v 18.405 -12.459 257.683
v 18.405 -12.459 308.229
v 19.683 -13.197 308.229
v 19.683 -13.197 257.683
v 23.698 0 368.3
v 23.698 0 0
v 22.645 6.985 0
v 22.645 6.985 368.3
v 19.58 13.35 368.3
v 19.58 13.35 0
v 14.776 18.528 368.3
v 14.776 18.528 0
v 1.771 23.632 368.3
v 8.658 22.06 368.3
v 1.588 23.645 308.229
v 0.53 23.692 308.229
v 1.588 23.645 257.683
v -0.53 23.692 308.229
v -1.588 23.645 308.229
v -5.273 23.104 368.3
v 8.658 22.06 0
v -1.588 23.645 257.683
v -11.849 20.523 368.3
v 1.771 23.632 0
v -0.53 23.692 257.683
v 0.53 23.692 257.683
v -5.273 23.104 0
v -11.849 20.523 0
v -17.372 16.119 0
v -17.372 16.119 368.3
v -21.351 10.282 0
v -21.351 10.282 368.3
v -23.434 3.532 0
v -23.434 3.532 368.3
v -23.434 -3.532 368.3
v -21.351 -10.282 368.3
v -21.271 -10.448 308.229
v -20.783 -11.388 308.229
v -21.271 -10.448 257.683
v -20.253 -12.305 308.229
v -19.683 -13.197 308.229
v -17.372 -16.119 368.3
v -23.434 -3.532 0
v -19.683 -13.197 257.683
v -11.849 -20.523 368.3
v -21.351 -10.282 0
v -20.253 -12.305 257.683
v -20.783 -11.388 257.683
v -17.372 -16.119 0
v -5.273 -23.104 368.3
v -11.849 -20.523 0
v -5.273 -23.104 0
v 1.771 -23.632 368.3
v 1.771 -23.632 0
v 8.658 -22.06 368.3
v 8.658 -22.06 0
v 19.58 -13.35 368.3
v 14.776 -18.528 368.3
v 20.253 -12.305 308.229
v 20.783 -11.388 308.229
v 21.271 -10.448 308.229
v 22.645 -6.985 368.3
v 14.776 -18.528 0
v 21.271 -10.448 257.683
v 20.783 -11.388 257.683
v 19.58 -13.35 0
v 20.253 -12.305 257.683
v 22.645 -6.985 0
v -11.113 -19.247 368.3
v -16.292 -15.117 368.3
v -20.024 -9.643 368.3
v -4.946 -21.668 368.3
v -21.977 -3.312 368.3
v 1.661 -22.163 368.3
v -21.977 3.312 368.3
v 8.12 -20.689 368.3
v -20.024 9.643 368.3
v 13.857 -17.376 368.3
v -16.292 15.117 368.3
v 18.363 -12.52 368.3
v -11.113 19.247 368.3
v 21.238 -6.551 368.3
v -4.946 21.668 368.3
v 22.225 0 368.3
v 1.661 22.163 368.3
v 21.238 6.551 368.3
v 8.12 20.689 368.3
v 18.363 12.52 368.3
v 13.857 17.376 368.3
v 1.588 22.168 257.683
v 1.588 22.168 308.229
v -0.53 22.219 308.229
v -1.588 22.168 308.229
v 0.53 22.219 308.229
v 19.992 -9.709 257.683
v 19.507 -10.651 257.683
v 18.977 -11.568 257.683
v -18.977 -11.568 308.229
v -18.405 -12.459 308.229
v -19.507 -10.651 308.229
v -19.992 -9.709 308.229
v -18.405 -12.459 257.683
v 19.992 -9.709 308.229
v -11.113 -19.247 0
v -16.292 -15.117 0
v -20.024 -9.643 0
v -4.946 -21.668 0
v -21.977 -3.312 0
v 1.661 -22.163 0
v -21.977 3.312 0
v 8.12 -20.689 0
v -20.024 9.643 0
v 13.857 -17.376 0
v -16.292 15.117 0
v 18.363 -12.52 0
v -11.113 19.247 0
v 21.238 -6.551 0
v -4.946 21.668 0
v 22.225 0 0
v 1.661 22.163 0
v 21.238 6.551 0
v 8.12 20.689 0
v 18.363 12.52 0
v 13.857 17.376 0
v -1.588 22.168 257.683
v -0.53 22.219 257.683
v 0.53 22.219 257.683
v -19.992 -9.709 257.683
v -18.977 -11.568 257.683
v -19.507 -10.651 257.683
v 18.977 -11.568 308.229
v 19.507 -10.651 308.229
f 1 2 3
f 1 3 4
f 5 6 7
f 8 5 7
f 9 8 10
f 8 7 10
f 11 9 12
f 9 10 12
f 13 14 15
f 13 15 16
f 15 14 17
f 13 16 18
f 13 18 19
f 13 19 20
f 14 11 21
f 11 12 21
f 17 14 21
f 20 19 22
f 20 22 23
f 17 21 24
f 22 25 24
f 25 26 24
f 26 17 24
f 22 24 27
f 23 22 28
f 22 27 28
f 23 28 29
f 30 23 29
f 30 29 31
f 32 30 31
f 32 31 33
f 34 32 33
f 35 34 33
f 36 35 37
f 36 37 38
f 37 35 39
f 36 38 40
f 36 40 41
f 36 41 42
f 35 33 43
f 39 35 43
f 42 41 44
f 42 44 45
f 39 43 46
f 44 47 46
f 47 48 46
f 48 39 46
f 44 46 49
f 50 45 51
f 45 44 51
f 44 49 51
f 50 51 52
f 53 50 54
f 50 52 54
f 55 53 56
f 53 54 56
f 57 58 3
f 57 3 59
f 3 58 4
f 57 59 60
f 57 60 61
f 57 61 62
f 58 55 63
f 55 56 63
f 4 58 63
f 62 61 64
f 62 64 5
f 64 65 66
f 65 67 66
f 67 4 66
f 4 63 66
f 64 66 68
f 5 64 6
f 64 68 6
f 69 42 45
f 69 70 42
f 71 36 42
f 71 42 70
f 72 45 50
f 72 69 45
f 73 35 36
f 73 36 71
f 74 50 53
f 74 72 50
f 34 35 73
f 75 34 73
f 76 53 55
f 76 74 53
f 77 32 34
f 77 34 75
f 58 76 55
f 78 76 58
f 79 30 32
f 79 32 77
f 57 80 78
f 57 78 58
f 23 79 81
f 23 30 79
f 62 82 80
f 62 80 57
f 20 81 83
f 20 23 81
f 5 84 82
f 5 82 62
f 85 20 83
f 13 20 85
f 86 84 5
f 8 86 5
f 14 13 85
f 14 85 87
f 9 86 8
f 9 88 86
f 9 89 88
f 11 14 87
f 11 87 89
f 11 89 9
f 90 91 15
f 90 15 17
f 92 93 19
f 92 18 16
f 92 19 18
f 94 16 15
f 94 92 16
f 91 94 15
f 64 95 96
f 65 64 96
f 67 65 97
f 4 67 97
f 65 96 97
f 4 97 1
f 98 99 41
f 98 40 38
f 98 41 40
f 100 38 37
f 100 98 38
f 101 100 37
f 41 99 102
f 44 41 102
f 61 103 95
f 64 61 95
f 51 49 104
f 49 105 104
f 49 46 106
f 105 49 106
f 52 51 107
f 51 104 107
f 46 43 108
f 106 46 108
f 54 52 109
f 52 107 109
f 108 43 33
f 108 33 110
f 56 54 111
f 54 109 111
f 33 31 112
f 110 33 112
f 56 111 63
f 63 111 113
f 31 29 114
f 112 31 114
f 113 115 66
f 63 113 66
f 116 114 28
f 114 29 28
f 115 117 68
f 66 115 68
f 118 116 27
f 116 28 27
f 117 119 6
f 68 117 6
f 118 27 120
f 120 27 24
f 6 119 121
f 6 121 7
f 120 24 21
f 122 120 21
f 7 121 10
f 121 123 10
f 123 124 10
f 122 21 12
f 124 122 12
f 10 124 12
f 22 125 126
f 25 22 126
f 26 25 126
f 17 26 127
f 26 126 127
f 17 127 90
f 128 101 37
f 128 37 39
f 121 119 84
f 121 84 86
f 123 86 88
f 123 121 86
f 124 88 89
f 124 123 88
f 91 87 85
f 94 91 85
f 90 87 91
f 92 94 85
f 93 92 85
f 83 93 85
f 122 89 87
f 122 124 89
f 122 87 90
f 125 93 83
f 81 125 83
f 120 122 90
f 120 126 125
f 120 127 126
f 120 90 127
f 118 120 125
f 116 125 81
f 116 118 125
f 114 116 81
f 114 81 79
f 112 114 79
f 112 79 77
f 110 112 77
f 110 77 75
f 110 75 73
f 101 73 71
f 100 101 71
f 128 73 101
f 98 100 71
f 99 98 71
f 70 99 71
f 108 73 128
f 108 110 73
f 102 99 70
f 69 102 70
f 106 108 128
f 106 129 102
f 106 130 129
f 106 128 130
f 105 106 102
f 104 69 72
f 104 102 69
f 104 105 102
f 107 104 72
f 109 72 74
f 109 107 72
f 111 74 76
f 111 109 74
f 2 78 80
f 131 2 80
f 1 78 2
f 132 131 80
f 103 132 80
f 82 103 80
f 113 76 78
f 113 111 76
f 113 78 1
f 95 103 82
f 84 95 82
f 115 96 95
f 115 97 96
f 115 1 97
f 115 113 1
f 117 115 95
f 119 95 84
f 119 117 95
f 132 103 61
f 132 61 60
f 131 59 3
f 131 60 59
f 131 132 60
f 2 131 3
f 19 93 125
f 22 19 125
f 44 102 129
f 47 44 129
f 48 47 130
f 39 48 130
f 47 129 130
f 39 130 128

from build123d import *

# Parameters (mm, degrees)
SKETCH1_R           = 23.6982
SKETCH1_R_2         = 22.225
BOSS_EXTRUDE1_DEPTH = 368.3
CUT_EXTRUDE1_START  = -77.831769
SKETCH2_W           = 3.175
SKETCH2_H           = 50.546
CUT_EXTRUDE1_DEPTH  = 1.529969
CIRPATTERN2_COUNT   = 3


with BuildPart() as part:
    # Sketch1 → Boss-Extrude1 (new body)
    with BuildSketch(Plane.XY):
        Circle(SKETCH1_R)
        Circle(SKETCH1_R_2, mode=Mode.SUBTRACT)
    extrude(amount=BOSS_EXTRUDE1_DEPTH)

    # Sketch2 → Cut-Extrude1 (cut)
    with BuildSketch(Plane(origin=(0, 100, 0), x_dir=(1, 0, 0), z_dir=(0, 1, 0)).offset(CUT_EXTRUDE1_START)):
        with Locations((0, -282.956)):
            Rectangle(SKETCH2_W, SKETCH2_H)
    cut_extrude1 = extrude(amount=CUT_EXTRUDE1_DEPTH, mode=Mode.SUBTRACT)

    # CirPattern2: Cut-Extrude1 ×3 about axis
    cirpattern2_axis = Axis((0, 0, 0), (0, 0, 1))
    for i in range(1, CIRPATTERN2_COUNT):
        add(cut_extrude1.rotate(cirpattern2_axis, i * 360 / CIRPATTERN2_COUNT), mode=Mode.SUBTRACT)


solid = part.part
